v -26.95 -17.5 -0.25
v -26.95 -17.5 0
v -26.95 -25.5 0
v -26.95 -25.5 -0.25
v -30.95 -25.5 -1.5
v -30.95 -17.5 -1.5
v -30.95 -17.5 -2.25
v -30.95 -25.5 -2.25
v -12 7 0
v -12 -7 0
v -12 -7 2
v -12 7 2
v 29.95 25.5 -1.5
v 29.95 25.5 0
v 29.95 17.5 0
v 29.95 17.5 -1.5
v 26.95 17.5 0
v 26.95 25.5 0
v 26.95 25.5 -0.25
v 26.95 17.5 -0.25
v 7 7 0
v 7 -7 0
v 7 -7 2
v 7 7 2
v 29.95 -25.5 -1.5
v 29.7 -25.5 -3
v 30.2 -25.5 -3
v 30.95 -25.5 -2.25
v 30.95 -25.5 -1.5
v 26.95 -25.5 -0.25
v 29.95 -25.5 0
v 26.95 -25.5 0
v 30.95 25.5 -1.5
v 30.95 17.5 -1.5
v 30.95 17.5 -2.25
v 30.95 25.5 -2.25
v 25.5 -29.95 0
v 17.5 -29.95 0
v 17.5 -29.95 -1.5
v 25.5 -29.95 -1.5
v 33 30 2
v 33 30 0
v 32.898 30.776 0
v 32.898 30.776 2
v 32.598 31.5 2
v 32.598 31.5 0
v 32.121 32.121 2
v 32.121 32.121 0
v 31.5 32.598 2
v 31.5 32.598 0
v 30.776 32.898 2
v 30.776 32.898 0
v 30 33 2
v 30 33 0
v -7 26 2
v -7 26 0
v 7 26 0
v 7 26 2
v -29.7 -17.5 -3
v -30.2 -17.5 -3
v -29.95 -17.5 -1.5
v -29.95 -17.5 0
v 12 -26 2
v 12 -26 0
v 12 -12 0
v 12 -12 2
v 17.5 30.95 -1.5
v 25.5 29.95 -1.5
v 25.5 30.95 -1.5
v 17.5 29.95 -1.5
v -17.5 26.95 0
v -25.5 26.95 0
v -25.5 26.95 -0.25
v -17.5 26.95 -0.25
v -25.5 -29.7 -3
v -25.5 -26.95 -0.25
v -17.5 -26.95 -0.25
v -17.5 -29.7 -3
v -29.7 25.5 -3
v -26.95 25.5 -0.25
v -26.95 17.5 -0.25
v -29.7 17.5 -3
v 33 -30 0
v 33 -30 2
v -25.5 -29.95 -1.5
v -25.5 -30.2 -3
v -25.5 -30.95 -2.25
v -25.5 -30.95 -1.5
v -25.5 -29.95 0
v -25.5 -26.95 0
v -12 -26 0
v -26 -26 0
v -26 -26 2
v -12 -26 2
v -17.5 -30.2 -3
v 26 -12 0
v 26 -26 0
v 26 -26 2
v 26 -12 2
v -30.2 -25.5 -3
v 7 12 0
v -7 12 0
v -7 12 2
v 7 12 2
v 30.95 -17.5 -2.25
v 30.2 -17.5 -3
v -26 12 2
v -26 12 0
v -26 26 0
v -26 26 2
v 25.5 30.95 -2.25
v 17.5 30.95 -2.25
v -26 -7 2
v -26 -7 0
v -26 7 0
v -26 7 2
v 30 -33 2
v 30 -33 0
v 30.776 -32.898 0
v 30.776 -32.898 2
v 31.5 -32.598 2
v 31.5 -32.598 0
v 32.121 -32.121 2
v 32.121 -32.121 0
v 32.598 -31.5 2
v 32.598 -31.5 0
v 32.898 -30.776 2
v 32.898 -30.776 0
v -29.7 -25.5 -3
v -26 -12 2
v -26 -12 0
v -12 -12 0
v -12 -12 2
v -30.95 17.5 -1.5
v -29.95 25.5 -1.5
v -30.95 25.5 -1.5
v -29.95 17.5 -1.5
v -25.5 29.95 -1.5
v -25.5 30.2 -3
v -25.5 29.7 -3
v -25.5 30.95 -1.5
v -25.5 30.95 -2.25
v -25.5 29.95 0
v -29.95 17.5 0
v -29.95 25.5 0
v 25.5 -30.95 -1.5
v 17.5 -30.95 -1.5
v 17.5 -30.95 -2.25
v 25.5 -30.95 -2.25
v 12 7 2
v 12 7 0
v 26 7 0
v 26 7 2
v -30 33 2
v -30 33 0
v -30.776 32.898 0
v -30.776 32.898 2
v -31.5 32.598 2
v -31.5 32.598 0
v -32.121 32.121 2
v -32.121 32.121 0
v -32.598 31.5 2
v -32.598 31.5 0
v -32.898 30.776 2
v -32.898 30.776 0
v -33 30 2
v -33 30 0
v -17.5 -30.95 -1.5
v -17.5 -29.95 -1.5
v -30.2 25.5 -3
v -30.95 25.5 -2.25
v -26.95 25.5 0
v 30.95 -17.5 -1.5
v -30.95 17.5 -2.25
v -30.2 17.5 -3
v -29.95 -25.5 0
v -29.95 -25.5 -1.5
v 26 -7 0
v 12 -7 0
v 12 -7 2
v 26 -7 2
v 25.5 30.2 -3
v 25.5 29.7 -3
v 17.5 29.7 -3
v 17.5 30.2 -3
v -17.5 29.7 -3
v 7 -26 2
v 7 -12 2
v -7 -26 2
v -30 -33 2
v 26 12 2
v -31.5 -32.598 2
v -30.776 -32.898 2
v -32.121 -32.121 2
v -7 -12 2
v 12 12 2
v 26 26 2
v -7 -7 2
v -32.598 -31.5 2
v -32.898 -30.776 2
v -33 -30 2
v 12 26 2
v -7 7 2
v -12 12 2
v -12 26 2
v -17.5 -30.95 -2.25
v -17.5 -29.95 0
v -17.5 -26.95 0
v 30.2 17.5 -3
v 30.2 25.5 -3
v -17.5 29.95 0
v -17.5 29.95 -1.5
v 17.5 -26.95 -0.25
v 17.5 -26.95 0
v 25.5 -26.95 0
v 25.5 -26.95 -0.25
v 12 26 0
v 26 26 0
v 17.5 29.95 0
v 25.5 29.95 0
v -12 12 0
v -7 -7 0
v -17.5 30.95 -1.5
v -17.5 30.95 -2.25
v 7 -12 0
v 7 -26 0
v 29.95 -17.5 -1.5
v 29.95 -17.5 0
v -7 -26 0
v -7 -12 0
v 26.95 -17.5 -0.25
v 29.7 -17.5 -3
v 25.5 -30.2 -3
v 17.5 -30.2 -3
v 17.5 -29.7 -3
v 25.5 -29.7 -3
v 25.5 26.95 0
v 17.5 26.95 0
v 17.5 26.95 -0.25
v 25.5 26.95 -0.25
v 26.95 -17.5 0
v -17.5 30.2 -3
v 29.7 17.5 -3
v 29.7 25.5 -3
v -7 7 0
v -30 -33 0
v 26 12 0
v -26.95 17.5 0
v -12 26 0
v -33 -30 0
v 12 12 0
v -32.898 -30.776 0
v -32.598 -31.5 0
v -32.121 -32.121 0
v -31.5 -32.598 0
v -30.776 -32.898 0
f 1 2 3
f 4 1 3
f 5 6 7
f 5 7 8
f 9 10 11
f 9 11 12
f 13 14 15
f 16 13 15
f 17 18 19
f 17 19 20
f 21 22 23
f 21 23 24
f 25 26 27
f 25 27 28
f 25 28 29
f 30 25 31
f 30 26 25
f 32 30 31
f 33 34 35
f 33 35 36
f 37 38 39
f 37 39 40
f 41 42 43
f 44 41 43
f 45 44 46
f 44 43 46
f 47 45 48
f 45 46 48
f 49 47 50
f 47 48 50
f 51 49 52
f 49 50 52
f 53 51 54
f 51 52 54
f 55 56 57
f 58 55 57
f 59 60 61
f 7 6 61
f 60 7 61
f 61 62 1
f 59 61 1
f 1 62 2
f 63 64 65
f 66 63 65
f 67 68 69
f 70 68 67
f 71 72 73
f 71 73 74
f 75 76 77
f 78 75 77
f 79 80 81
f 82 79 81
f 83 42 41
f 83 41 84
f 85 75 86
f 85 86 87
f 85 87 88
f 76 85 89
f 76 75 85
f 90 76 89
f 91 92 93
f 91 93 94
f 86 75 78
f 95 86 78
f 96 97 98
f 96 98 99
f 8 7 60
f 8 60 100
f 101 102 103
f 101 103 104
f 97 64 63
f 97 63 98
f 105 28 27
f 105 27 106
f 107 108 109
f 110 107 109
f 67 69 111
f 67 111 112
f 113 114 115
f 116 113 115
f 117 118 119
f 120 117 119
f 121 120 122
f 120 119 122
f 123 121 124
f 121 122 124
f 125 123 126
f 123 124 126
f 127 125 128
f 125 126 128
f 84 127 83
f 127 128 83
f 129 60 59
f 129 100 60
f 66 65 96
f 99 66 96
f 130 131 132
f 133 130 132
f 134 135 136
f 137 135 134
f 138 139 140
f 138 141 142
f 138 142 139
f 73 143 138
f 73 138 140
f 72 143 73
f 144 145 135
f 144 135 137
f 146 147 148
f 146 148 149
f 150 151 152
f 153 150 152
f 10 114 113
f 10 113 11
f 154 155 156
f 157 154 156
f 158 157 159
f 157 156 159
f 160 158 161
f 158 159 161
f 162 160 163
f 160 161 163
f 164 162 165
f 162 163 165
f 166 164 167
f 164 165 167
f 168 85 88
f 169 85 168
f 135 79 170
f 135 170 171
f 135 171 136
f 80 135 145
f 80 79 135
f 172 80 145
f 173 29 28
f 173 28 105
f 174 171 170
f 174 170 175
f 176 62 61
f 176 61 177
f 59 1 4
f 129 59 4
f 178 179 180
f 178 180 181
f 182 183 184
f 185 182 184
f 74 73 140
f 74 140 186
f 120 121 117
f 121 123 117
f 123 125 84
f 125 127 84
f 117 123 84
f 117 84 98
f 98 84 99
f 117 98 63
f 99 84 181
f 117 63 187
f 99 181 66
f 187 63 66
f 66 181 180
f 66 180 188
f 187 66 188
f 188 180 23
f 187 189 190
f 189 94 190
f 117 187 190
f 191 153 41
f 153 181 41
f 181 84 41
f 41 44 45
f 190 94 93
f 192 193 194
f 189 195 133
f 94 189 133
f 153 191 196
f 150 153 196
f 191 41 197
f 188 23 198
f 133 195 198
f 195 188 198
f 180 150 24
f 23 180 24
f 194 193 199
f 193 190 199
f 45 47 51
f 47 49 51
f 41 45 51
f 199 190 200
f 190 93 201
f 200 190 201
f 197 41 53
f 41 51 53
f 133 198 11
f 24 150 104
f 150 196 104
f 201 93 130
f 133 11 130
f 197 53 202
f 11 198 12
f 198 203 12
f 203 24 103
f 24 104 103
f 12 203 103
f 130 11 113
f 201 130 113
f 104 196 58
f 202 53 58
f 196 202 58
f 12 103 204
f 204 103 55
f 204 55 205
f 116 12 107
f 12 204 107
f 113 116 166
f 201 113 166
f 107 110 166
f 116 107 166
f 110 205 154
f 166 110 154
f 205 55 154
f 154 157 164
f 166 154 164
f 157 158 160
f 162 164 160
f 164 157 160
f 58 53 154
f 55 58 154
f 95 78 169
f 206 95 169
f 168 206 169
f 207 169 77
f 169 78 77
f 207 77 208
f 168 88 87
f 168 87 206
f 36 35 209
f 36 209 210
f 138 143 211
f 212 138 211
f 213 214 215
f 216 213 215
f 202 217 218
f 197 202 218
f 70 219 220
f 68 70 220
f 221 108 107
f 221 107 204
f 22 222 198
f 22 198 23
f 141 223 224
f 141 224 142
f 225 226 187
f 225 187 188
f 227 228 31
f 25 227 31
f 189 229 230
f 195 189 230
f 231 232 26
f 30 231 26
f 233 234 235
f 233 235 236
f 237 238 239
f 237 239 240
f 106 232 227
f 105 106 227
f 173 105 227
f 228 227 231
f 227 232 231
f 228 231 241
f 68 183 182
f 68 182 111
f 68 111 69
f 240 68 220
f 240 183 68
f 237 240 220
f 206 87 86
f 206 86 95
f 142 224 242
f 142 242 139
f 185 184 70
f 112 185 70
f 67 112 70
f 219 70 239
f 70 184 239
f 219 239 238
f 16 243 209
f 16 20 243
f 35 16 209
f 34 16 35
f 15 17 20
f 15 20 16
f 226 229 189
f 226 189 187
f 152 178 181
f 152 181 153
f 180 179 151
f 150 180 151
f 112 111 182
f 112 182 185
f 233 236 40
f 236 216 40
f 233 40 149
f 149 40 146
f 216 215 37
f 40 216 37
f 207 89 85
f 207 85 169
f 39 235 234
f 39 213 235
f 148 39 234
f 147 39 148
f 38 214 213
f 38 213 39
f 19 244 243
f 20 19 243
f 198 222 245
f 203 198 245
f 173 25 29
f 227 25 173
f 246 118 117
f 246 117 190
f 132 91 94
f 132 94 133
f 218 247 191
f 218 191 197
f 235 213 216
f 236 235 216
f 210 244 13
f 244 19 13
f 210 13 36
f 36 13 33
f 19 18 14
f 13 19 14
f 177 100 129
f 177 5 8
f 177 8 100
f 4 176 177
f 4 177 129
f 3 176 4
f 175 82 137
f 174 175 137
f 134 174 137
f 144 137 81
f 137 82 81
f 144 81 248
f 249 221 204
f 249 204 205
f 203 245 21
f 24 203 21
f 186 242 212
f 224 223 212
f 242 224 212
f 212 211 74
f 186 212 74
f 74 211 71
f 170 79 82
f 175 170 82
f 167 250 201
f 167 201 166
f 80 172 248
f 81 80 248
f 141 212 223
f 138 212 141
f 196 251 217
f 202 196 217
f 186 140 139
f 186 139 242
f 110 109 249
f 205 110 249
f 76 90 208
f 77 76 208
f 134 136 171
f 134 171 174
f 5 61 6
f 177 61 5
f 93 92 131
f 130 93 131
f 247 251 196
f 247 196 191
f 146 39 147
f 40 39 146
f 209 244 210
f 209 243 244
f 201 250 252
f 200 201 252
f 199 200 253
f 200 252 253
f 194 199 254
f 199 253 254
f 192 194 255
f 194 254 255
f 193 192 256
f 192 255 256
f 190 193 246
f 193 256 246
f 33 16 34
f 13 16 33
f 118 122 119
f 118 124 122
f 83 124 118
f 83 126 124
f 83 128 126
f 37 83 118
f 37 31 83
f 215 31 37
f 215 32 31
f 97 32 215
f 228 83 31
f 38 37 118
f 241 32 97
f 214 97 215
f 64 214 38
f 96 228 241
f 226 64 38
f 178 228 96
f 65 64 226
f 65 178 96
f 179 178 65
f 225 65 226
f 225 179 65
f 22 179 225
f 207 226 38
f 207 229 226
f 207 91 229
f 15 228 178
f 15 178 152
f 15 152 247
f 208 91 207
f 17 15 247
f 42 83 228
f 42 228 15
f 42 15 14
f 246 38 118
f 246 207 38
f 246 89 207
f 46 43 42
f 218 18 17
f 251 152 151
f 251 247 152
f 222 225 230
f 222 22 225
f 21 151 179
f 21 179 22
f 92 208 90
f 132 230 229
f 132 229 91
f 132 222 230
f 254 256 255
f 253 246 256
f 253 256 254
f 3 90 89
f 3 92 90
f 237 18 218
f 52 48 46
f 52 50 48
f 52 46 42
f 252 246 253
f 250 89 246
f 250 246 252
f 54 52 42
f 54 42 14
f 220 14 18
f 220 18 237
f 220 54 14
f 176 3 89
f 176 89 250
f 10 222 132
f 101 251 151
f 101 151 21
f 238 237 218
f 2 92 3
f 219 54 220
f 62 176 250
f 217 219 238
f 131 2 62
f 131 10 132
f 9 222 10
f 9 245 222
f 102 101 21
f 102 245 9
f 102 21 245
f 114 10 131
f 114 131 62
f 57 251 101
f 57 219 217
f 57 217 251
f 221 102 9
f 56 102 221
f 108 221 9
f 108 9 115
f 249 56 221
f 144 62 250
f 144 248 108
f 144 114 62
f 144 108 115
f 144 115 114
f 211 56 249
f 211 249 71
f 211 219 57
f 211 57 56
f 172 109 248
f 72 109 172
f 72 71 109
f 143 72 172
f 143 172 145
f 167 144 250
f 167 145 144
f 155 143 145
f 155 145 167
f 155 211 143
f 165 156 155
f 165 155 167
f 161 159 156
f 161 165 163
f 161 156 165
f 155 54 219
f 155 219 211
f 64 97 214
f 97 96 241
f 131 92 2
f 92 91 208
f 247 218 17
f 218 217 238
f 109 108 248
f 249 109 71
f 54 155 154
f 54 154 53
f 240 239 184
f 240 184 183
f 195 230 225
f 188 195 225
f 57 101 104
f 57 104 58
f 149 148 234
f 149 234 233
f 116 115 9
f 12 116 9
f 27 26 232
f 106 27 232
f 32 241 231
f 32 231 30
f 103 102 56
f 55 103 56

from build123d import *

# Parameters (mm, degrees)
SKETCH_W        = 14
SKETCH_H        = 14
PAD_DEPTH       = 2
SKETCH004_W     = 8
SKETCH004_H     = 3
SKETCH004_W_2   = 3
SKETCH004_H_2   = 8
PAD003_DEPTH    = 3
SKETCH005_W     = 8
SKETCH005_H     = 1.5
PAD004_DEPTH    = 1
SKETCH008_W     = 8
SKETCH008_H     = 1.5
PAD005_DEPTH    = 1
SKETCH007_W     = 8
SKETCH007_H     = 1.5
PAD006_DEPTH    = 1
SKETCH006_W     = 8
SKETCH006_H     = 1.5
PAD007_DEPTH    = 1
CHAMFER_SIZE    = 2.75
CHAMFER001_SIZE = 0.75


with BuildPart() as part:
    # Sketch → Pad (new body)
    with BuildSketch(Plane.XY):
        with BuildLine():
            Line((-30, 33), (30, 33))
            ThreePointArc((33, 30), (32.12132, 32.12132), (30, 33))
            Line((33, 30), (33, -30))
            ThreePointArc((30, -33), (32.12132, -32.12132), (33, -30))
            Line((30, -33), (-30, -33))
            ThreePointArc((-33, -30), (-32.12132, -32.12132), (-30, -33))
            Line((-33, -30), (-33, 30))
            ThreePointArc((-30, 33), (-32.12132, 32.12132), (-33, 30))
        make_face()
        Rectangle(SKETCH_W, SKETCH_H, mode=Mode.SUBTRACT)
        with Locations((19, 0)):
            Rectangle(SKETCH_W, SKETCH_H, mode=Mode.SUBTRACT)
        with Locations((-19, 0)):
            Rectangle(SKETCH_W, SKETCH_H, mode=Mode.SUBTRACT)
        with Locations((0, 19)):
            Rectangle(SKETCH_W, SKETCH_H, mode=Mode.SUBTRACT)
        with Locations((19, 19)):
            Rectangle(SKETCH_W, SKETCH_H, mode=Mode.SUBTRACT)
        with Locations((-19, 19)):
            Rectangle(SKETCH_W, SKETCH_H, mode=Mode.SUBTRACT)
        with Locations((0, -19)):
            Rectangle(SKETCH_W, SKETCH_H, mode=Mode.SUBTRACT)
        with Locations((19, -19)):
            Rectangle(SKETCH_W, SKETCH_H, mode=Mode.SUBTRACT)
        with Locations((-19, -19)):
            Rectangle(SKETCH_W, SKETCH_H, mode=Mode.SUBTRACT)
    extrude(amount=PAD_DEPTH)

    # Sketch004 (on DatumPlane) → Pad003 (join)
    with BuildSketch(Plane(origin=(0, 0, 0), x_dir=(1, 0, 0), z_dir=(0, 0, -1))):
        with Locations((-21.5, -28.45)):
            Rectangle(SKETCH004_W, SKETCH004_H)
        with Locations((-28.45, -21.5)):
            Rectangle(SKETCH004_W_2, SKETCH004_H_2)
        with Locations((21.5, -28.45)):
            Rectangle(SKETCH004_W, SKETCH004_H)
        with Locations((28.45, -21.5)):
            Rectangle(SKETCH004_W_2, SKETCH004_H_2)
        with Locations((-28.45, 21.5)):
            Rectangle(SKETCH004_W_2, SKETCH004_H_2)
        with Locations((28.45, 21.5)):
            Rectangle(SKETCH004_W_2, SKETCH004_H_2)
        with Locations((-21.5, 28.45)):
            Rectangle(SKETCH004_W, SKETCH004_H)
        with Locations((21.5, 28.45)):
            Rectangle(SKETCH004_W, SKETCH004_H)
    extrude(amount=PAD003_DEPTH)

    # Sketch005 (on Face43 of Pad003) → Pad004 (join)
    with BuildSketch(Plane.YZ.offset(29.95)):
        with Locations((-21.5, -2.25)):
            Rectangle(SKETCH005_W, SKETCH005_H)
        with Locations((21.5, -2.25)):
            Rectangle(SKETCH005_W, SKETCH005_H)
    extrude(amount=PAD004_DEPTH)

    # Sketch008 (on Face11 of Pad003) → Pad005 (join)
    with BuildSketch(Plane.XZ.offset(29.95)):
        with Locations((-21.5, -2.25)):
            Rectangle(SKETCH008_W, SKETCH008_H)
        with Locations((21.5, -2.25)):
            Rectangle(SKETCH008_W, SKETCH008_H)
    extrude(amount=PAD005_DEPTH)

    # Sketch007 (on Face51 of Pad003) → Pad006 (join)
    with BuildSketch(Plane(origin=(-29.95, 0, 0), x_dir=(0, -1, 0), z_dir=(-1, 0, 0))):
        with Locations((-21.5, -2.25)):
            Rectangle(SKETCH007_W, SKETCH007_H)
        with Locations((21.5, -2.25)):
            Rectangle(SKETCH007_W, SKETCH007_H)
    extrude(amount=PAD006_DEPTH)

    # Sketch006 (on Face75 of Pad003) → Pad007 (join)
    with BuildSketch(Plane(origin=(0, 29.95, 0), x_dir=(-1, 0, 0), z_dir=(0, 1, 0))):
        with Locations((-21.5, -2.25)):
            Rectangle(SKETCH006_W, SKETCH006_H)
        with Locations((21.5, -2.25)):
            Rectangle(SKETCH006_W, SKETCH006_H)
    extrude(amount=PAD007_DEPTH)

    # Chamfer
    chamfer_edges = [part.edges().sort_by_distance(p)[0] for p in [
        (-26.95, -21.5, -3),
        (-21.5, -26.95, -3),
        (21.5, -26.95, -3),
        (26.95, -21.5, -3),
        (-26.95, 21.5, -3),
        (-21.5, 26.95, -3),
        (21.5, 26.95, -3),
        (26.95, 21.5, -3),
    ]]
    chamfer(chamfer_edges, length=CHAMFER_SIZE)

    # Chamfer001
    chamfer001_edges = [part.edges().sort_by_distance(p)[0] for p in [
        (30.95, 21.5, -3),
        (21.5, 30.95, -3),
        (-21.5, 30.95, -3),
        (-30.95, 21.5, -3),
        (-30.95, -21.5, -3),
        (-21.5, -30.95, -3),
        (21.5, -30.95, -3),
        (30.95, -21.5, -3),
    ]]
    chamfer(chamfer001_edges, length=CHAMFER001_SIZE)


solid = part.part
